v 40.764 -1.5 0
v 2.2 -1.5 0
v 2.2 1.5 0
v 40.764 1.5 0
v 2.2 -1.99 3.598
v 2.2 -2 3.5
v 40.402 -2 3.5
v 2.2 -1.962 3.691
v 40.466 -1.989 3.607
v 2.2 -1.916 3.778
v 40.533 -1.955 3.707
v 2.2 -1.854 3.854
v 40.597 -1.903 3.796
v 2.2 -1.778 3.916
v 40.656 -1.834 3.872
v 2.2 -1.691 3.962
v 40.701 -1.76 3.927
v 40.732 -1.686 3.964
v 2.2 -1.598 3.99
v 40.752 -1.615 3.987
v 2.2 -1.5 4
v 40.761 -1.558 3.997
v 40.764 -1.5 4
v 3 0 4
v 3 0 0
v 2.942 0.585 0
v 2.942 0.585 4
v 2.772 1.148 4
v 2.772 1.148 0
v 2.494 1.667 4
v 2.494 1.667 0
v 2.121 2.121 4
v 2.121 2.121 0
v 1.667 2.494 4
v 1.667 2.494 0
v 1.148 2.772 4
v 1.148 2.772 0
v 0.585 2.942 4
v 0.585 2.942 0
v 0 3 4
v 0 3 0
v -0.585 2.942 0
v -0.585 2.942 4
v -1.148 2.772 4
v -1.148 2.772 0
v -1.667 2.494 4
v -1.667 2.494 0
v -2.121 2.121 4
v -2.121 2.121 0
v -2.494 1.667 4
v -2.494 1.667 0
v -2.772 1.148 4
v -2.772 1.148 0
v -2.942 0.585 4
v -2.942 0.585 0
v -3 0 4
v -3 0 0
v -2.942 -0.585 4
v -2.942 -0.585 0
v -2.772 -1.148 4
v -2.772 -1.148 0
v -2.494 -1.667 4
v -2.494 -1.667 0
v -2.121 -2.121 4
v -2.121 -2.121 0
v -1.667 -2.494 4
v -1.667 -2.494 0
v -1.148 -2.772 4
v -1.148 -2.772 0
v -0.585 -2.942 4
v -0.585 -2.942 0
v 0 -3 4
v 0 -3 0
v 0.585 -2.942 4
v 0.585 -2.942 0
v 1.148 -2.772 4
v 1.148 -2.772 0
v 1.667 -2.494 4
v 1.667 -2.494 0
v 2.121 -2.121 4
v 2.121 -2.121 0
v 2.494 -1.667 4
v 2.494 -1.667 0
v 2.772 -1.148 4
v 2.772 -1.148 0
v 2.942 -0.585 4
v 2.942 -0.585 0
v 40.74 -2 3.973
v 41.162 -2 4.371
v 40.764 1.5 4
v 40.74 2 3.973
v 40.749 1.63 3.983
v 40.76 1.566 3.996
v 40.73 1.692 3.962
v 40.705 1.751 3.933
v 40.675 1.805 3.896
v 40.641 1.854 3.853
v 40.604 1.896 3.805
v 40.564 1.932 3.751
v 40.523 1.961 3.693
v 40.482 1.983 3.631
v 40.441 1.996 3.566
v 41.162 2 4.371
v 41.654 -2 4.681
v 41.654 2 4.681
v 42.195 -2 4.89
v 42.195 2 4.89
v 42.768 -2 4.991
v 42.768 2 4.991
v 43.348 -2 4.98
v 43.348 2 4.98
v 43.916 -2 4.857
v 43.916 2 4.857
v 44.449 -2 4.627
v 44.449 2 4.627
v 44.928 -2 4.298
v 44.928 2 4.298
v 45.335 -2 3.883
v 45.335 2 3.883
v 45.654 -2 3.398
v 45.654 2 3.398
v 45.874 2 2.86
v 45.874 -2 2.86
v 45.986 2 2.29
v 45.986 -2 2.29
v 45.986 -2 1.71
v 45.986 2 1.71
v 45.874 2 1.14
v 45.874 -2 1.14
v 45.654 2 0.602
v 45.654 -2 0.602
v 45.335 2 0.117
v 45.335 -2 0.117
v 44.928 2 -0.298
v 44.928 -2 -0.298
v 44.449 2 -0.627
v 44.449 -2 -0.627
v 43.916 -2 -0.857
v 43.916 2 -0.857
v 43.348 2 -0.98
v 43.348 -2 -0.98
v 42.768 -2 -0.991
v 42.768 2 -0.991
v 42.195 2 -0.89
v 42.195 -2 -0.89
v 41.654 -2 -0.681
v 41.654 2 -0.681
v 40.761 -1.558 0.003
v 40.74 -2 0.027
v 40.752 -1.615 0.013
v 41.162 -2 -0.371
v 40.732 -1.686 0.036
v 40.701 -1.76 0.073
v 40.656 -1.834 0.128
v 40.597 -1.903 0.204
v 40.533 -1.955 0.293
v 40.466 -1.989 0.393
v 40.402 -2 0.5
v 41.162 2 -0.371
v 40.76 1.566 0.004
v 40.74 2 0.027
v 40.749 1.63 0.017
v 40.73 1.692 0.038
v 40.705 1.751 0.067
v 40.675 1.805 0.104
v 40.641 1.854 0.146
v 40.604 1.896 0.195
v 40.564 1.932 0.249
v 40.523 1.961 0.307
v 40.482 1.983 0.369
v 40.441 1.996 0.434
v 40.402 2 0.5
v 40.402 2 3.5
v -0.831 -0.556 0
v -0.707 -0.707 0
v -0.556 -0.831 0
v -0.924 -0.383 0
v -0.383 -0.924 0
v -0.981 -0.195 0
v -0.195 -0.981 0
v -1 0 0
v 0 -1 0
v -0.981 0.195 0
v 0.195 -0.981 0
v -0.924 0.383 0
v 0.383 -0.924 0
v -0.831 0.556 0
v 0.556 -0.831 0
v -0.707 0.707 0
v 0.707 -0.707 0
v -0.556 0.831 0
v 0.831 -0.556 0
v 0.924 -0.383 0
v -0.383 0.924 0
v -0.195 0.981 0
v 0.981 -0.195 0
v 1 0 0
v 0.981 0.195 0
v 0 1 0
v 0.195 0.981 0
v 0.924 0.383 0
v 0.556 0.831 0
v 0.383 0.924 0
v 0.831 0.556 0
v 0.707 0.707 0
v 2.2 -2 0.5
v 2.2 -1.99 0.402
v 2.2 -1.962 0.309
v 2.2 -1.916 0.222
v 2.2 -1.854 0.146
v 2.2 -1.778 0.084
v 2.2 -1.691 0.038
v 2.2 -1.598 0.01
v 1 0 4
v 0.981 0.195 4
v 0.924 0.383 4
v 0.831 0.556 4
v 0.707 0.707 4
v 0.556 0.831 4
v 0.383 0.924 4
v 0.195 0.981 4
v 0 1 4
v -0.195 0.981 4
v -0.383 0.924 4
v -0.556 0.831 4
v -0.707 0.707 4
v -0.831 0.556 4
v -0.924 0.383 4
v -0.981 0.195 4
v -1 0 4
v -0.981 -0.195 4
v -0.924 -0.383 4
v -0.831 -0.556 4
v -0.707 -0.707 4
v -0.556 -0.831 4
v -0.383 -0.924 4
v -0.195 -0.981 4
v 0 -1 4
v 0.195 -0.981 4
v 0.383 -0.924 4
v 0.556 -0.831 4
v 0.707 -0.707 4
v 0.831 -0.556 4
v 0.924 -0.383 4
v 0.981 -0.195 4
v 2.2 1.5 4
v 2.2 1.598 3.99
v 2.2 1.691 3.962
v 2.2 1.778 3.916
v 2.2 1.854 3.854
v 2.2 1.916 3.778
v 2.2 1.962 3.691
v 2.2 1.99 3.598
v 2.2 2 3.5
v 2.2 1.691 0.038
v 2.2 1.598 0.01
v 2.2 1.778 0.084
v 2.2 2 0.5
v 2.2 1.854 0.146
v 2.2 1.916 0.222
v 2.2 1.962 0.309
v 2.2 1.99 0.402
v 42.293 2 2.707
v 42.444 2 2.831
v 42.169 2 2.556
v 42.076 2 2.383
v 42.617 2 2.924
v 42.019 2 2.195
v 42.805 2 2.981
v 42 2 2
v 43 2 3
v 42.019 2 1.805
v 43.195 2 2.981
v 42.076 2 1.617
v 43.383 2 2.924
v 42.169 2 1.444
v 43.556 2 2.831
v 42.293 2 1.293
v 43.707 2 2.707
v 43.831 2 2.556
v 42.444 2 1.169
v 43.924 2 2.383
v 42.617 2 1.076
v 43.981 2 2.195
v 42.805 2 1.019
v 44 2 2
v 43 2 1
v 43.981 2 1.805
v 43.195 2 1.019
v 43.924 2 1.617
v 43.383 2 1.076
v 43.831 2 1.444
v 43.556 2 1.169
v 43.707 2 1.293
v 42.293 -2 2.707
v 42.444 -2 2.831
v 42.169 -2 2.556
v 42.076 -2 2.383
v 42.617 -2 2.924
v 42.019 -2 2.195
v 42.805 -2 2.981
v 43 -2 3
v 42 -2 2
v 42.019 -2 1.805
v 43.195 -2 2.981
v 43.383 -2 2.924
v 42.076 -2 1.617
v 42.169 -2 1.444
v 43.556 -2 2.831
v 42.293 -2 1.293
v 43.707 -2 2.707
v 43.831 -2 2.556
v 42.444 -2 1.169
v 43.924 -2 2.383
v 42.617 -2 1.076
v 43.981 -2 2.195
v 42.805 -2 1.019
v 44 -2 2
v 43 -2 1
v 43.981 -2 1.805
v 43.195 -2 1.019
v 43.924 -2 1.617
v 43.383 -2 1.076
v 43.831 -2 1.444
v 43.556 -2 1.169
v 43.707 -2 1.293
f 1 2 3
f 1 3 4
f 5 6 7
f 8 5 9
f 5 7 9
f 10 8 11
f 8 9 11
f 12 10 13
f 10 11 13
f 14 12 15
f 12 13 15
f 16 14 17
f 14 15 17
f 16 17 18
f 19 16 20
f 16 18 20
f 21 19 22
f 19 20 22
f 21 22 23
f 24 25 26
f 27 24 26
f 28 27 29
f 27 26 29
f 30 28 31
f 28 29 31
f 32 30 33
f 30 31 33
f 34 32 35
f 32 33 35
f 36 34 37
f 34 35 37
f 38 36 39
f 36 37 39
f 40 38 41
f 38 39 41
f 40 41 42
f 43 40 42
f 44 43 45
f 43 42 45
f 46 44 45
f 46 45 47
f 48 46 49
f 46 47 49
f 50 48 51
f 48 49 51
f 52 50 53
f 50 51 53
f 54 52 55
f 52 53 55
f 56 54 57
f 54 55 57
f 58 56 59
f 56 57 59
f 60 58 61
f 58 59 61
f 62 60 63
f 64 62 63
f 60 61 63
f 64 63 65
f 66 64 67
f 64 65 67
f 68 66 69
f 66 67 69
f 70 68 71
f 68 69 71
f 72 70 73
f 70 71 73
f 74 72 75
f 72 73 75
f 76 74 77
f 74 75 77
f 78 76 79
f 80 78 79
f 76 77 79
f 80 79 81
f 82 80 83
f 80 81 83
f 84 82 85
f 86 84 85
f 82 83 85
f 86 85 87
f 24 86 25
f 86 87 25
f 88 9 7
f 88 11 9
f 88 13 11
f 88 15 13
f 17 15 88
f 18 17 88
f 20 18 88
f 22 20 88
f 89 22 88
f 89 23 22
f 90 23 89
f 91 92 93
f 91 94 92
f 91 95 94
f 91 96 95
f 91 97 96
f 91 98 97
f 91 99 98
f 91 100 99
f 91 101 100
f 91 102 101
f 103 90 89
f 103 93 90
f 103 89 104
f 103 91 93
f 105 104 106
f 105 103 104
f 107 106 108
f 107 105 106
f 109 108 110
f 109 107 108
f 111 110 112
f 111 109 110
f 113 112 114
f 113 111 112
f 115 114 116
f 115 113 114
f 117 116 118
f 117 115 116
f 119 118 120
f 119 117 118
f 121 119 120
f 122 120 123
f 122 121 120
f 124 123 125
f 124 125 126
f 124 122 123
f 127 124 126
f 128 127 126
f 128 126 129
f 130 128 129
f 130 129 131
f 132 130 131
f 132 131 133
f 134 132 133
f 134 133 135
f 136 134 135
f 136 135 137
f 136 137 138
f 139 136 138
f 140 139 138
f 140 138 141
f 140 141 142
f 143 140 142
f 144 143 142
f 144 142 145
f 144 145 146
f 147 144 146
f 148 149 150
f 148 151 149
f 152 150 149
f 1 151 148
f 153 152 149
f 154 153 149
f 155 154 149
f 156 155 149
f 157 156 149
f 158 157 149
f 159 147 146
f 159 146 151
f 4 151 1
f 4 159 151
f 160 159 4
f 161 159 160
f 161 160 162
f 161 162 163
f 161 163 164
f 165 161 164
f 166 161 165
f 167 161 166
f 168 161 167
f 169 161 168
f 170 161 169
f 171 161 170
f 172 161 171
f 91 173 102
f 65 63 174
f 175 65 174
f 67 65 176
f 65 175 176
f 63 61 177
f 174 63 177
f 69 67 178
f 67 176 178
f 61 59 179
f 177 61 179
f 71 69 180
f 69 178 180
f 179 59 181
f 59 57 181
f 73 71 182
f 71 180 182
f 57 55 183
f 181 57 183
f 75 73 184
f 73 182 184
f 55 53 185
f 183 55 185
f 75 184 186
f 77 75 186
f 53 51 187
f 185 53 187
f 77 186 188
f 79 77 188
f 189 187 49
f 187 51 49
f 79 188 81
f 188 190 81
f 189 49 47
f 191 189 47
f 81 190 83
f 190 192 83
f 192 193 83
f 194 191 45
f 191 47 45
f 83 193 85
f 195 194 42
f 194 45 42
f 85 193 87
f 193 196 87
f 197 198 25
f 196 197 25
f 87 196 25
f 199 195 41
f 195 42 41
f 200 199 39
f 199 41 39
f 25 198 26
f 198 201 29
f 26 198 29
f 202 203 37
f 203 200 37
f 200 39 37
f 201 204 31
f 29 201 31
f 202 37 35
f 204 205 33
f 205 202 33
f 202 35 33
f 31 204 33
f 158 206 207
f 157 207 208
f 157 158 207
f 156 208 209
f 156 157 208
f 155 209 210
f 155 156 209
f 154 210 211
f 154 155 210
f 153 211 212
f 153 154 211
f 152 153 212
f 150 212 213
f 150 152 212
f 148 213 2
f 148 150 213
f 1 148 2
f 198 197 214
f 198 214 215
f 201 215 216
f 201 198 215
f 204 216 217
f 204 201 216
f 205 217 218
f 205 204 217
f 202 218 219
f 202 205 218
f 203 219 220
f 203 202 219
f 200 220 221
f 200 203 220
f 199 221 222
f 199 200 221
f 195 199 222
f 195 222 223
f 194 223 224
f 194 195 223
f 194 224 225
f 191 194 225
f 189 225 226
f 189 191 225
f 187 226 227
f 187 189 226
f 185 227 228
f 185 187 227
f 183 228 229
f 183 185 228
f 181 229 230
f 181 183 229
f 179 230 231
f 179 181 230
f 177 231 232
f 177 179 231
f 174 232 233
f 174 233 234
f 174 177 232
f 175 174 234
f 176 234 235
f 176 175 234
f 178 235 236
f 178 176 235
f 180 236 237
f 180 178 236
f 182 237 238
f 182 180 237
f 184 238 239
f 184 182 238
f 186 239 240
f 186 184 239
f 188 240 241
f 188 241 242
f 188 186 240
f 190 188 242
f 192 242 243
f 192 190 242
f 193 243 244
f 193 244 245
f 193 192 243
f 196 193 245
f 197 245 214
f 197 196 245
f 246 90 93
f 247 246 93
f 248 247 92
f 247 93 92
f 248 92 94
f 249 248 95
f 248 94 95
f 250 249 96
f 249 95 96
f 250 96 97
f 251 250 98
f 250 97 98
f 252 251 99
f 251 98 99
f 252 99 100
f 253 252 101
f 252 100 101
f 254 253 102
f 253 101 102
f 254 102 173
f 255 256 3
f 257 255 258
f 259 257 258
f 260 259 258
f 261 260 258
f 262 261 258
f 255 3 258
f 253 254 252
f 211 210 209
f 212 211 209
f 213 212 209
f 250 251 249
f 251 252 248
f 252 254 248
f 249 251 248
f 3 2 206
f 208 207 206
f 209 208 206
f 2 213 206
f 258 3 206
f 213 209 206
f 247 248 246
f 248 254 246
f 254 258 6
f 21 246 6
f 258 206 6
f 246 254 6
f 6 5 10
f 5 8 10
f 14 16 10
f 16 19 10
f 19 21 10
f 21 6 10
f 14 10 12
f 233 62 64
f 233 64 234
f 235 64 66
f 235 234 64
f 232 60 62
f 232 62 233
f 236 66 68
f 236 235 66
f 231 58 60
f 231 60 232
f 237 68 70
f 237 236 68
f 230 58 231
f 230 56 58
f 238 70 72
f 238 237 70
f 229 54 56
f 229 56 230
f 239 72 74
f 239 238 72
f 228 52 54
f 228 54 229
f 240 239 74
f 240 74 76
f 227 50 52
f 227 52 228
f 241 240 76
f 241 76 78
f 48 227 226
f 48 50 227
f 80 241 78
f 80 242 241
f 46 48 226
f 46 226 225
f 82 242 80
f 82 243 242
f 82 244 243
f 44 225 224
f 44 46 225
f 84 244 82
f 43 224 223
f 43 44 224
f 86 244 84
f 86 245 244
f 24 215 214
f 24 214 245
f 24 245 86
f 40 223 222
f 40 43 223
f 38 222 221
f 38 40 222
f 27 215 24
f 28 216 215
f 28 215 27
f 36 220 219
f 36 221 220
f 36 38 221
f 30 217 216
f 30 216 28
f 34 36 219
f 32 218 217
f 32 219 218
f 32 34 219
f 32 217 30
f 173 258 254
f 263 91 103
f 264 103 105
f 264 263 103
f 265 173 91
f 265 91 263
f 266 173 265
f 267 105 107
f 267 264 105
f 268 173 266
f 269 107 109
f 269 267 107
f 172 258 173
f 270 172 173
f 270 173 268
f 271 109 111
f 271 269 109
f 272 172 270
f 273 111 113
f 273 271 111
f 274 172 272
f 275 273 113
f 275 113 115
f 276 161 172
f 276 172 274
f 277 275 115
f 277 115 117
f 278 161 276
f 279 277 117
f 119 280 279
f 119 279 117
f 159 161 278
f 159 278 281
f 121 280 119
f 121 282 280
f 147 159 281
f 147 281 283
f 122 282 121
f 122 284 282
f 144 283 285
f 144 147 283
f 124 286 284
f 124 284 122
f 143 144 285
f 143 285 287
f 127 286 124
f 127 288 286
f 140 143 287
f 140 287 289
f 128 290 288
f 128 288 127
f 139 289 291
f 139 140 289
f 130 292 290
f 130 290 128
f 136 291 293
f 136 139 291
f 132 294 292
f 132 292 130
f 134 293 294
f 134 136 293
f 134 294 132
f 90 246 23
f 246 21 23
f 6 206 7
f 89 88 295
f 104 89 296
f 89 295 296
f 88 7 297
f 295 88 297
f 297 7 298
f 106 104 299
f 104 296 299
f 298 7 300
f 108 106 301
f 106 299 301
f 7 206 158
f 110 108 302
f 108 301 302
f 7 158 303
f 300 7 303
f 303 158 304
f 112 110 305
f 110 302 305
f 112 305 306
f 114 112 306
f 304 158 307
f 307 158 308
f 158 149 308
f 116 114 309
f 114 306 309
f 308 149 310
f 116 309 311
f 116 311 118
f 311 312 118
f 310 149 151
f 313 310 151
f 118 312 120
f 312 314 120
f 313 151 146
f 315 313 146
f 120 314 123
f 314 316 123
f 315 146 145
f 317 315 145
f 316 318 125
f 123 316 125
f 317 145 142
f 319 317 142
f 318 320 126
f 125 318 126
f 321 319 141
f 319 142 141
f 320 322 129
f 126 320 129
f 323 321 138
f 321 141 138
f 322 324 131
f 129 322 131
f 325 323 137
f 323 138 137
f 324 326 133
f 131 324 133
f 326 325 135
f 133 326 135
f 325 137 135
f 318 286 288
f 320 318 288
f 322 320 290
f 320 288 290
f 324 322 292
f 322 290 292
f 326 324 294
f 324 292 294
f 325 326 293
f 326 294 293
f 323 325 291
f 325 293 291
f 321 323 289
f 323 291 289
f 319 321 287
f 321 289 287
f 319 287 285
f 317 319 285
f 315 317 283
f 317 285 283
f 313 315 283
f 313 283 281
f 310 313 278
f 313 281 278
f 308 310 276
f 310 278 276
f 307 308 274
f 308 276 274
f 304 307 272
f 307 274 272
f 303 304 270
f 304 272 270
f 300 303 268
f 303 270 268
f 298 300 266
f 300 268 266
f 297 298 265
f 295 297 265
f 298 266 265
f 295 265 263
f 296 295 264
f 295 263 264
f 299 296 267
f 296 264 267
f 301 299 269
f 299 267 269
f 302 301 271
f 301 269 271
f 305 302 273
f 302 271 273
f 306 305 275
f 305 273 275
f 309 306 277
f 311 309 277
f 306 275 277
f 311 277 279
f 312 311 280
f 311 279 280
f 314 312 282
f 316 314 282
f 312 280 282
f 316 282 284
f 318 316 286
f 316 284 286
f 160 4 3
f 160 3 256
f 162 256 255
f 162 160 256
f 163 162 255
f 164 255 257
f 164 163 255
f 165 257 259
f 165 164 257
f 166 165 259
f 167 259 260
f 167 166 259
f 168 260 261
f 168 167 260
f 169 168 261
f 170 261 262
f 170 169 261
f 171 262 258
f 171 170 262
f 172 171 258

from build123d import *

# Parameters (mm, degrees)
SKETCH_R      = 3
SKETCH_R_2    = 1
PAD_DEPTH     = 4
SKETCH001_W   = 38.6
SKETCH001_H   = 4
PAD001_DEPTH  = 2
FILLET_R      = 0.5
FILLET001_R   = 0.5
FILLET002_R   = 0.5
FILLET003_R   = 0.5
SKETCH002_R   = 3
SKETCH002_R_2 = 1
PAD002_DEPTH  = 4


with BuildPart() as pad:
    # Sketch → Pad (new body)
    with BuildSketch(Plane.XY):
        Circle(SKETCH_R)
        Circle(SKETCH_R_2, mode=Mode.SUBTRACT)
    extrude(amount=PAD_DEPTH)


with BuildPart() as pad002:
    # Sketch001 → Pad001 (new body, symmetric)
    with BuildSketch(Plane.XZ):
        with Locations((21.5, 2)):
            Rectangle(SKETCH001_W, SKETCH001_H)
    extrude(amount=PAD001_DEPTH, both=True)

    # Fillet
    fillet_edges = [pad002.edges().sort_by_distance(p)[0] for p in [
        (21.5, -2, 4),
    ]]
    fillet(fillet_edges, radius=FILLET_R)

    # Fillet001
    fillet001_edges = [pad002.edges().sort_by_distance(p)[0] for p in [
        (21.5, 2, 4),
    ]]
    fillet(fillet001_edges, radius=FILLET001_R)

    # Fillet002
    fillet002_edges = [pad002.edges().sort_by_distance(p)[0] for p in [
        (21.5, -2, 0),
    ]]
    fillet(fillet002_edges, radius=FILLET002_R)

    # Fillet003
    fillet003_edges = [pad002.edges().sort_by_distance(p)[0] for p in [
        (21.5, 2, 0),
    ]]
    fillet(fillet003_edges, radius=FILLET003_R)

    # Sketch002 → Pad002 (new body)
    with BuildSketch(Plane(origin=(0, 2, 0), x_dir=(1, 0, 0), z_dir=(0, 1, 0))):
        with Locations((43, -2)):
            Circle(SKETCH002_R)
        with Locations((43, -2)):
            Circle(SKETCH002_R_2, mode=Mode.SUBTRACT)
    extrude(amount=-PAD002_DEPTH)


solid = Compound([pad.part, pad002.part])
